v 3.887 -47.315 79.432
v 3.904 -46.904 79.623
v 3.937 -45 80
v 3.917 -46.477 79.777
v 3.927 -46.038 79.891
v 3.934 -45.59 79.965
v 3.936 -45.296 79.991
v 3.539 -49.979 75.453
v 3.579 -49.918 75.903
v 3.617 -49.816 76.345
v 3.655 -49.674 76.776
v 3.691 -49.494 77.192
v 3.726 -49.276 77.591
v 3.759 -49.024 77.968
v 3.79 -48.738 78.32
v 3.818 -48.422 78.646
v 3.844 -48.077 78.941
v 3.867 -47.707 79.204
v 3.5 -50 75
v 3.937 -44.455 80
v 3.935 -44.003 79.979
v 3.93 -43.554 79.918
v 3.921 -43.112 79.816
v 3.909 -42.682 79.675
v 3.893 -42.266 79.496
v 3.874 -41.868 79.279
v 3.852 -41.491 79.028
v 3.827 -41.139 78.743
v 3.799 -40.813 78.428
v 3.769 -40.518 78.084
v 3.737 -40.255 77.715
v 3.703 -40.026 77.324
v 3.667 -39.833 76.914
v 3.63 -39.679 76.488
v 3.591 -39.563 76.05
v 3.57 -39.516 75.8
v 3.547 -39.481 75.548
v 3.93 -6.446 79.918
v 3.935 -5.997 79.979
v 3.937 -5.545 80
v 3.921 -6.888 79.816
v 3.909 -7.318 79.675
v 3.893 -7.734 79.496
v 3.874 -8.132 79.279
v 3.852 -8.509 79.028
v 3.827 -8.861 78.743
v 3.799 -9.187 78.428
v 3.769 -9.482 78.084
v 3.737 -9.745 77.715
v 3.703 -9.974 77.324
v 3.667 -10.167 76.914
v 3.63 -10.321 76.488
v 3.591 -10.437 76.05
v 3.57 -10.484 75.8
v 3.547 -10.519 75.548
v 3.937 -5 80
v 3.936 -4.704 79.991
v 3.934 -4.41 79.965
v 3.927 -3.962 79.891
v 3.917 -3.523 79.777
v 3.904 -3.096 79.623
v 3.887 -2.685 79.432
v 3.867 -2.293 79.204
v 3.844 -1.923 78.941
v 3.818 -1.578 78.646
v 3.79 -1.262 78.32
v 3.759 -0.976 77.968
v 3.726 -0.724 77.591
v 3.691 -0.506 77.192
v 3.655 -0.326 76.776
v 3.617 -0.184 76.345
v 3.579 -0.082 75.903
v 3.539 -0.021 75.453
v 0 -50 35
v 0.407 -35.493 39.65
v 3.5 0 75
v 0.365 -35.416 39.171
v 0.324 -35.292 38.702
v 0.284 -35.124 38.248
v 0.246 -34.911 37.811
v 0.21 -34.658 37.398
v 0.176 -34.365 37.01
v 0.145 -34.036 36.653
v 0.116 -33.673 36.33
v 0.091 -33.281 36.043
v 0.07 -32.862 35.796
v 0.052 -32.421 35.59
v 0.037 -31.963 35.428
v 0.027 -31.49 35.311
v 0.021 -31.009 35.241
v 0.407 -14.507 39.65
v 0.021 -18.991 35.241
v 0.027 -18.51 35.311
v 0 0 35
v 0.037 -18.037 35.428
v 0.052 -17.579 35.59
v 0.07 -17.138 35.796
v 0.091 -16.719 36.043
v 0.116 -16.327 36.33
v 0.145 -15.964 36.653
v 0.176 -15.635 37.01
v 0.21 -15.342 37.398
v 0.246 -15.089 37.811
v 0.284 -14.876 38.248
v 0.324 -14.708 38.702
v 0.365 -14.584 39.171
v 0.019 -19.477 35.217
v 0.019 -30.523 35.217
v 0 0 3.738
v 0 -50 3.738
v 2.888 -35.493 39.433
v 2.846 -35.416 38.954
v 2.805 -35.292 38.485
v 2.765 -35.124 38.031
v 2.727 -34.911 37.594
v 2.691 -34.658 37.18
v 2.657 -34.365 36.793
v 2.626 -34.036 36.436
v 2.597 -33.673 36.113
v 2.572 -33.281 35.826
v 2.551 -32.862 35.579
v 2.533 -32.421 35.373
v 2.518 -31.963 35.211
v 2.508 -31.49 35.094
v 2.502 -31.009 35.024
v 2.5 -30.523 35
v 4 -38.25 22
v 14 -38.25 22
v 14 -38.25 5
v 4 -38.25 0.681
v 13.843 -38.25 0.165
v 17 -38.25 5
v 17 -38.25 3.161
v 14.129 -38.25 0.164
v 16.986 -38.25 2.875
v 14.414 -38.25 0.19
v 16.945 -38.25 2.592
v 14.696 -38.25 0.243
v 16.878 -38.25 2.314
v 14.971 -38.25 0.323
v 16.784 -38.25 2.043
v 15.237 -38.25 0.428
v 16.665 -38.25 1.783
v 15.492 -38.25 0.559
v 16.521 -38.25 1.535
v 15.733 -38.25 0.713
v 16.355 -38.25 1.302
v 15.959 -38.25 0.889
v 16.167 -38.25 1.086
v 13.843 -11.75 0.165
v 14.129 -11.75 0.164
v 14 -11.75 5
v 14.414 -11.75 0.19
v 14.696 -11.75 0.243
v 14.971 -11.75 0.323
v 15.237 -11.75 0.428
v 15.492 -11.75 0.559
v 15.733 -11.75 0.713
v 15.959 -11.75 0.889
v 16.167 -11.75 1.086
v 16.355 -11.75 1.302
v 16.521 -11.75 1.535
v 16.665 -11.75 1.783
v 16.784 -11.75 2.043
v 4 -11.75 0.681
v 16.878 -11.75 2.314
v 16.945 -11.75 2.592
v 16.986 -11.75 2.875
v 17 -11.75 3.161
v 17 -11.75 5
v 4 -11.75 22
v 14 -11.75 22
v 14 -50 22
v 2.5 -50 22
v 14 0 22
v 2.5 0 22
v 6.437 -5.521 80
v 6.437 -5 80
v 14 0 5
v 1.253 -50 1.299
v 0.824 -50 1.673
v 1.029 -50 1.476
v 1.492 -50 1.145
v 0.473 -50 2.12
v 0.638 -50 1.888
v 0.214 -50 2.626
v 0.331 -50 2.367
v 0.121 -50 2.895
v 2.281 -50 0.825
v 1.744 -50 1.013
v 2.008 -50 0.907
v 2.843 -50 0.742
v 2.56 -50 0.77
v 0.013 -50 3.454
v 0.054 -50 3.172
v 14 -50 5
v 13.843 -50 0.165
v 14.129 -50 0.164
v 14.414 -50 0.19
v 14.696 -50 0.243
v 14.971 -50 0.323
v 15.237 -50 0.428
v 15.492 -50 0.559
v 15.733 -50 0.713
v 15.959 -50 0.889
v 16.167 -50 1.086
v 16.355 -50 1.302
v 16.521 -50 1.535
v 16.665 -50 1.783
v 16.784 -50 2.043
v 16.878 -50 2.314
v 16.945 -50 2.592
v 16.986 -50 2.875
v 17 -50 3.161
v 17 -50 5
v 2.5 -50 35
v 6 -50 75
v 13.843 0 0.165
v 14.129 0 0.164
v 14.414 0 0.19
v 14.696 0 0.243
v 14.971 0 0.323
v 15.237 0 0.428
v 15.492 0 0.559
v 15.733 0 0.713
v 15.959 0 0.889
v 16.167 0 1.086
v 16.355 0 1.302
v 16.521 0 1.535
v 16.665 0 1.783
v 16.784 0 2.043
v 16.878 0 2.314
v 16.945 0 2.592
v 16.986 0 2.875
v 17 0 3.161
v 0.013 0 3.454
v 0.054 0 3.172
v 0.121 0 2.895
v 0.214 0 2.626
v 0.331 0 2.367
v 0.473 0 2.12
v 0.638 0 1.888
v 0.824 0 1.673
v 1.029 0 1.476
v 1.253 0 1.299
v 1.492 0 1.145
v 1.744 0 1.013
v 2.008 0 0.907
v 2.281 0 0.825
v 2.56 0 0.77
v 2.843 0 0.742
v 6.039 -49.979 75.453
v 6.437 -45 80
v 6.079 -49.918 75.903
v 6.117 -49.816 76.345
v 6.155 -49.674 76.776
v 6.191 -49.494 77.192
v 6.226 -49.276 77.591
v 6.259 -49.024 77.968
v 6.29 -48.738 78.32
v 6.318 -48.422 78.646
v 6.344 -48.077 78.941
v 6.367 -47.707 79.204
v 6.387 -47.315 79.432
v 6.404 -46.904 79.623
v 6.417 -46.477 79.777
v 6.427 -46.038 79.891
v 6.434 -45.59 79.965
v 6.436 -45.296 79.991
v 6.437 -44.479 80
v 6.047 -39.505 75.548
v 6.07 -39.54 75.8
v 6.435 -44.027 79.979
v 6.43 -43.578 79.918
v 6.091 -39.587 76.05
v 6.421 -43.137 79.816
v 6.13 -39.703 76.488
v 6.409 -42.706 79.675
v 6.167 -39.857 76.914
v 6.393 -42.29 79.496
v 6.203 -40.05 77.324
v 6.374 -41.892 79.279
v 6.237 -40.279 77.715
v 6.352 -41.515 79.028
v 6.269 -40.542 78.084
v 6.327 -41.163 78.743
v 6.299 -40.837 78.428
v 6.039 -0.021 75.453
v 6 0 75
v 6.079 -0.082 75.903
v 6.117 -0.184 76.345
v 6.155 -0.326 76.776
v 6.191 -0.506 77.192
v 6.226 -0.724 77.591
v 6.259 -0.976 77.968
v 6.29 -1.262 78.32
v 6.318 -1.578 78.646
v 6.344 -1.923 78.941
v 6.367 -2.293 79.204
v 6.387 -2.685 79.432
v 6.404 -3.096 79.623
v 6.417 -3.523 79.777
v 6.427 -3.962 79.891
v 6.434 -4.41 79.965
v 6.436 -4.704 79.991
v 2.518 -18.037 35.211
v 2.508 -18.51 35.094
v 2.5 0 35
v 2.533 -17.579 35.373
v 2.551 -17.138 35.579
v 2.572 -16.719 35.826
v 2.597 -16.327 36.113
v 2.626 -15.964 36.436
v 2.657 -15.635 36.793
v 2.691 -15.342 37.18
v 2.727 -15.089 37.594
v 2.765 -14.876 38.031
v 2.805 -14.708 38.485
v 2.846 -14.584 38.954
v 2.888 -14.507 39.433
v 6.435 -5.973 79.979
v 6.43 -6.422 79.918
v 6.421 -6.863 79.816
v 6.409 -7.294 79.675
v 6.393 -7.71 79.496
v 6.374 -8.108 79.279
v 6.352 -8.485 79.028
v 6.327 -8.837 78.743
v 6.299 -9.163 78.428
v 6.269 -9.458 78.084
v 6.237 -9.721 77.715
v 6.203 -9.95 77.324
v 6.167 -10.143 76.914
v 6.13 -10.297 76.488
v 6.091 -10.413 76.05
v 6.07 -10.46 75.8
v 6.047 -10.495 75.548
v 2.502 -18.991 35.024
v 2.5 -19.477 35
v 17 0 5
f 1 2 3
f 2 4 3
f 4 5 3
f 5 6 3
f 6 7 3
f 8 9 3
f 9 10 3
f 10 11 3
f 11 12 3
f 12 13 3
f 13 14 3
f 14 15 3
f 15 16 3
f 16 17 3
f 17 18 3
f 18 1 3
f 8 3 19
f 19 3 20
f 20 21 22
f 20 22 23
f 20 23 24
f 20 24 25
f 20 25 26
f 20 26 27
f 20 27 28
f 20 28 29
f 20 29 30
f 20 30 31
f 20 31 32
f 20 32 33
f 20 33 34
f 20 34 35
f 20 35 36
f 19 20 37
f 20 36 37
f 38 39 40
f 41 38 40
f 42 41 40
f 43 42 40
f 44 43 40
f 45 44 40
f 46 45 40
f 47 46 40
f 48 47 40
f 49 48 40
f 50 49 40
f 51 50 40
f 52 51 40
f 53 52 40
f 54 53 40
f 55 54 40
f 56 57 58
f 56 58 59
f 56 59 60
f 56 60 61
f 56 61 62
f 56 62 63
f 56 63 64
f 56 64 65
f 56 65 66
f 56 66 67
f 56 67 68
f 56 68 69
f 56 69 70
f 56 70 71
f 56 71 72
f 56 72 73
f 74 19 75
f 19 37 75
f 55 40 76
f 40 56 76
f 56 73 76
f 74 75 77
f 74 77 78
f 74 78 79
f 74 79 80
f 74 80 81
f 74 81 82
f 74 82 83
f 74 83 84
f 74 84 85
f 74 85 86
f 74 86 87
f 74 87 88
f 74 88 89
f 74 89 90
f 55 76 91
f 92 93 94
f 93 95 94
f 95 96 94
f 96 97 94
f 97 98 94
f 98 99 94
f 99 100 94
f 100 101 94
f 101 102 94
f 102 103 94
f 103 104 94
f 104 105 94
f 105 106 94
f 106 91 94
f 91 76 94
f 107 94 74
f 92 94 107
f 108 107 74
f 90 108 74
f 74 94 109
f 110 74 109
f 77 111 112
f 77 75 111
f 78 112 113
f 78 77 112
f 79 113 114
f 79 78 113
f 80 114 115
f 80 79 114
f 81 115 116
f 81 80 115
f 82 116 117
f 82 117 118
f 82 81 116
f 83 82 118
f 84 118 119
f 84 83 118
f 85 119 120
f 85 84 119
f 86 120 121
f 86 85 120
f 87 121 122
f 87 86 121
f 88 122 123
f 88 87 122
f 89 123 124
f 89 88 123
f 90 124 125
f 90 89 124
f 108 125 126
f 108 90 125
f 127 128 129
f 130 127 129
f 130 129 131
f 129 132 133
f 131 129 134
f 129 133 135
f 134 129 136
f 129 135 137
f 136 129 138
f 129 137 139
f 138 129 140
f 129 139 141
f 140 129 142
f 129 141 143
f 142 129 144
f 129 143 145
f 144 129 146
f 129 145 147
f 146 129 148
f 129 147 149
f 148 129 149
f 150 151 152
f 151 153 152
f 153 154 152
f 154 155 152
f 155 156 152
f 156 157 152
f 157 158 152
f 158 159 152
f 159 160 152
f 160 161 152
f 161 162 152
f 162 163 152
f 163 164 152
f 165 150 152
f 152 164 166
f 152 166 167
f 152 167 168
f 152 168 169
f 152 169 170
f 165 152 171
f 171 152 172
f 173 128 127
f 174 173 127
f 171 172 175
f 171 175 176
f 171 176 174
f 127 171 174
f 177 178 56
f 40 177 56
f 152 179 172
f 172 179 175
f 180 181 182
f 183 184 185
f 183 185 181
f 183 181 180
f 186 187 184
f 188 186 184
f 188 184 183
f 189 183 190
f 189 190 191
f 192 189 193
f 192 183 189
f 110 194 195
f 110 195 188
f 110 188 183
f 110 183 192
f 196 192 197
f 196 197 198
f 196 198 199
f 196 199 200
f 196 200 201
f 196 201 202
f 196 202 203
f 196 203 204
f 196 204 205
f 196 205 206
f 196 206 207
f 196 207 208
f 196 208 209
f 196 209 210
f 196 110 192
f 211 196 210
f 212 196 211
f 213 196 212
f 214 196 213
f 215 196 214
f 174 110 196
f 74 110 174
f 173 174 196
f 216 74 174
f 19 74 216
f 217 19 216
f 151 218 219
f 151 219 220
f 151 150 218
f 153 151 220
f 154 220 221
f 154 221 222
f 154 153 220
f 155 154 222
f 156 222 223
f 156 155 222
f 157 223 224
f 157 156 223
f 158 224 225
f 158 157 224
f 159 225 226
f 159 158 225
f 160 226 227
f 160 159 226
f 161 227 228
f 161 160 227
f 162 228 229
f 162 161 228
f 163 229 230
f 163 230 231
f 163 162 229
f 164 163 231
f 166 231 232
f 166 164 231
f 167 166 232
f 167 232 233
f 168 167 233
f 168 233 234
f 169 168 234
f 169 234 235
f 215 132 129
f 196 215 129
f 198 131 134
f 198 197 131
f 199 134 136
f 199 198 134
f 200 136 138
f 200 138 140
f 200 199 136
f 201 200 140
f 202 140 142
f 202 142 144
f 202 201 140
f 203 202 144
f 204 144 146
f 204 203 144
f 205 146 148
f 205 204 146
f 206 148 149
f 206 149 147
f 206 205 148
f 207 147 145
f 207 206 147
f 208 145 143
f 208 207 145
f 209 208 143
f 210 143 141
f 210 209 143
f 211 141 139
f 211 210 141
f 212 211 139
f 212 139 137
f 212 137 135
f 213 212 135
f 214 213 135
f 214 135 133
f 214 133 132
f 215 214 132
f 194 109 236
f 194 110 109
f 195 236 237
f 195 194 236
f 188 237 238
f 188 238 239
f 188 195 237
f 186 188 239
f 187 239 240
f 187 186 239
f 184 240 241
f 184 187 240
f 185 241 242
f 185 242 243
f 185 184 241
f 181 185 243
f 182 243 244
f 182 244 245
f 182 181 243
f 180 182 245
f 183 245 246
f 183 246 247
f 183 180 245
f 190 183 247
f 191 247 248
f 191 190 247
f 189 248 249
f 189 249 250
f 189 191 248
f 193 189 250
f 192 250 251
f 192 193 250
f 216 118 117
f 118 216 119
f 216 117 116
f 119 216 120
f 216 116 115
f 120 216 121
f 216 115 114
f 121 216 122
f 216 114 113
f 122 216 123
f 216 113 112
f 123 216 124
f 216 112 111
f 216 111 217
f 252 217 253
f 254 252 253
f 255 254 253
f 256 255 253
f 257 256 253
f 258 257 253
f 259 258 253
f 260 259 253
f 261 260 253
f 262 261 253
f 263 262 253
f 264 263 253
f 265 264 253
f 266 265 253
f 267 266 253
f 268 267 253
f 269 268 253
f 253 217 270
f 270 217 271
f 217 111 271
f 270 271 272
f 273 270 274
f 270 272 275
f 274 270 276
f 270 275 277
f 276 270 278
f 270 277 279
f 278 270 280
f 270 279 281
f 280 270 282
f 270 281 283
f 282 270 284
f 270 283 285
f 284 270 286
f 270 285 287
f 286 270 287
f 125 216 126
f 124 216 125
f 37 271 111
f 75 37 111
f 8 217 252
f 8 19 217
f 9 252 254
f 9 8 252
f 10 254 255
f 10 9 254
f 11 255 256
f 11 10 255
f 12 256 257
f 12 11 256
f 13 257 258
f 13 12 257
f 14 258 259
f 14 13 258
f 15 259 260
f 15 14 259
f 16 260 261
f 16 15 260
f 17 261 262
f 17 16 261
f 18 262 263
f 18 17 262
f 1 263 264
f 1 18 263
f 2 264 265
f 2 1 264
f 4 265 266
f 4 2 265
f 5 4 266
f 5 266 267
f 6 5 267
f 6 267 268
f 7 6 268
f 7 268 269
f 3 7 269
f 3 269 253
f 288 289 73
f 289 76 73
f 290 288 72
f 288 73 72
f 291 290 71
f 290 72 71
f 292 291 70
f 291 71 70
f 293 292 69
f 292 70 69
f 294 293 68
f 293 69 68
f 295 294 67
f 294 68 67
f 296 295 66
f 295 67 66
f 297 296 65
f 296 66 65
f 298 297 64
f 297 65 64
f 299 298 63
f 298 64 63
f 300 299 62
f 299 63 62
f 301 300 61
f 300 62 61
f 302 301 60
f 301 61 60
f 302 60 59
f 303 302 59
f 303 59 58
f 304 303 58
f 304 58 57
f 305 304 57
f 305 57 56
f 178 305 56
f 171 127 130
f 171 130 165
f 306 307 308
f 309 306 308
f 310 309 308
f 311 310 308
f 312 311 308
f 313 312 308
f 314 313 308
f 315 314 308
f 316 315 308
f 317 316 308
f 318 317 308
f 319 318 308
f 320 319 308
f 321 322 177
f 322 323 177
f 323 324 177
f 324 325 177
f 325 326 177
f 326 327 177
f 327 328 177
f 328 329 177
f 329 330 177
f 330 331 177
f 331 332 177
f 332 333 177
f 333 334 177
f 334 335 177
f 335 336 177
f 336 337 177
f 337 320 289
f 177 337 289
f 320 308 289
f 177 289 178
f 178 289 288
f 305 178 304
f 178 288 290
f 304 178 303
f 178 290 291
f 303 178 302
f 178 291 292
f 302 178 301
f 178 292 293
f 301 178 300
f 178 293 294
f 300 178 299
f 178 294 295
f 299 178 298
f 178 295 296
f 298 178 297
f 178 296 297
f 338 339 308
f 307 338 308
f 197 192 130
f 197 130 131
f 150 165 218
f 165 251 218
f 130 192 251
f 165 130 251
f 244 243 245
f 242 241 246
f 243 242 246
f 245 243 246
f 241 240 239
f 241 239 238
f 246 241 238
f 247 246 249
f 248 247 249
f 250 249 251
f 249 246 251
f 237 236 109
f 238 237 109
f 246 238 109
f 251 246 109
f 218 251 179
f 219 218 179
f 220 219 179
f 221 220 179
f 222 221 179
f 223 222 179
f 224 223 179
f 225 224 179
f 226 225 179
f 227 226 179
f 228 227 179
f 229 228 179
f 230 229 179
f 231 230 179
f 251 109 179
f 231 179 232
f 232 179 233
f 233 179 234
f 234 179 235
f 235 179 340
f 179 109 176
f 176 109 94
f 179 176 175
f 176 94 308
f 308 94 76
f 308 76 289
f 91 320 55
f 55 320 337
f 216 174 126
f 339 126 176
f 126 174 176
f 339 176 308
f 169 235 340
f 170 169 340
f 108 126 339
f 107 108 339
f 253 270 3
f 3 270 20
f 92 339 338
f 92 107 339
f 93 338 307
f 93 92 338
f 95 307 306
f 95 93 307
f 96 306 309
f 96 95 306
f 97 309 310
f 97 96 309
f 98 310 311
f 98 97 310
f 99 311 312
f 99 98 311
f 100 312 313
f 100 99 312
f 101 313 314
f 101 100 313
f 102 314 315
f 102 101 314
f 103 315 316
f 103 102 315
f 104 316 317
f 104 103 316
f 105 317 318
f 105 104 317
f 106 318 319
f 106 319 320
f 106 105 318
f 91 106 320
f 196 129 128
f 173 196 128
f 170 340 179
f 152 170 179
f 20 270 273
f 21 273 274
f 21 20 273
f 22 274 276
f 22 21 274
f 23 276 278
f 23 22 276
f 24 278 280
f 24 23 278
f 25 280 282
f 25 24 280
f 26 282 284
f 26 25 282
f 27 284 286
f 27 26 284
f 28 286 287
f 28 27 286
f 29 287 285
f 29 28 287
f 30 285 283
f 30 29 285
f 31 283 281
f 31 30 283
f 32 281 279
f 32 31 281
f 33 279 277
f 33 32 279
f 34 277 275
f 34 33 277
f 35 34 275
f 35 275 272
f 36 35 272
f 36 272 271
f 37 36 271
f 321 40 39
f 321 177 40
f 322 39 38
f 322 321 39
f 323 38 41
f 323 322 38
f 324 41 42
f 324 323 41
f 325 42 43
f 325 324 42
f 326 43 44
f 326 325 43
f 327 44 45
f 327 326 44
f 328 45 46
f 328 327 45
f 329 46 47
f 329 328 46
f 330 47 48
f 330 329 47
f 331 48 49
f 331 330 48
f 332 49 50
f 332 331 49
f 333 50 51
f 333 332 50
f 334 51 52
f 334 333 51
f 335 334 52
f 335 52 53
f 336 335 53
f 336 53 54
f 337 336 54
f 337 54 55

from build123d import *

# Parameters (mm, degrees)
F1_DEPTH = 50
F2_W     = 26.5
F2_H     = 29.9426466227
F2_H_2   = 5
F3_DEPTH = 13
F5_R     = 3
F7_DEPTH = 25
F8_R     = 5


with BuildPart() as f1:
    # F0 (on Front) → F1 (new body)
    with BuildSketch(Plane.XZ):
        Polygon((0, 35), (0, 0.8909322478), (17, 0), (17, 5), (14, 5), (14, 22), (2.5, 22), (2.5, 35), (6.4369898587, 80), (3.9369898587, 80), align=None)
    extrude(amount=F1_DEPTH)

    # F2 (on face) → F3 (cut)
    with BuildSketch(Plane.YZ.offset(17)):
        with Locations((-25, 19.9713233113)):
            Rectangle(F2_W, F2_H)
        with Locations((-25, 2.5)):
            Rectangle(F2_W, F2_H_2)
    extrude(amount=-F3_DEPTH, mode=Mode.SUBTRACT)

    # F5
    f5_edges = [f1.edges().sort_by_distance(p)[0] for p in [
        (0, -25, 0.890932),
        (17, -44.125, 0),
        (17, -5.875, 0),
    ]]
    fillet(f5_edges, radius=F5_R)

    # F6 (on face) → F7 (cut)
    with BuildSketch(Plane(origin=(-0.5578334179, 0, 0.0488041002), x_dir=(0, 1, 0), z_dir=(0.9961946981, 0, -0.0871557427))):
        Polygon((-40, 80.2565964795), (-35, 35.0847037901), (-15, 35.0847037901), (-10, 80.2565964795), align=None)
    extrude(amount=-F7_DEPTH, mode=Mode.SUBTRACT)

    # F8
    f8_edges = [f1.edges().sort_by_distance(p)[0] for p in [
        (5.18699, -50, 80),
        (5.18699, -39.987941, 80),
        (5.18699, -10.012059, 80),
        (5.18699, 0, 80),
        (1.259495, -15, 35.10853),
        (1.259495, -35, 35.10853),
    ]]
    fillet(f8_edges, radius=F8_R)


solid = f1.part
